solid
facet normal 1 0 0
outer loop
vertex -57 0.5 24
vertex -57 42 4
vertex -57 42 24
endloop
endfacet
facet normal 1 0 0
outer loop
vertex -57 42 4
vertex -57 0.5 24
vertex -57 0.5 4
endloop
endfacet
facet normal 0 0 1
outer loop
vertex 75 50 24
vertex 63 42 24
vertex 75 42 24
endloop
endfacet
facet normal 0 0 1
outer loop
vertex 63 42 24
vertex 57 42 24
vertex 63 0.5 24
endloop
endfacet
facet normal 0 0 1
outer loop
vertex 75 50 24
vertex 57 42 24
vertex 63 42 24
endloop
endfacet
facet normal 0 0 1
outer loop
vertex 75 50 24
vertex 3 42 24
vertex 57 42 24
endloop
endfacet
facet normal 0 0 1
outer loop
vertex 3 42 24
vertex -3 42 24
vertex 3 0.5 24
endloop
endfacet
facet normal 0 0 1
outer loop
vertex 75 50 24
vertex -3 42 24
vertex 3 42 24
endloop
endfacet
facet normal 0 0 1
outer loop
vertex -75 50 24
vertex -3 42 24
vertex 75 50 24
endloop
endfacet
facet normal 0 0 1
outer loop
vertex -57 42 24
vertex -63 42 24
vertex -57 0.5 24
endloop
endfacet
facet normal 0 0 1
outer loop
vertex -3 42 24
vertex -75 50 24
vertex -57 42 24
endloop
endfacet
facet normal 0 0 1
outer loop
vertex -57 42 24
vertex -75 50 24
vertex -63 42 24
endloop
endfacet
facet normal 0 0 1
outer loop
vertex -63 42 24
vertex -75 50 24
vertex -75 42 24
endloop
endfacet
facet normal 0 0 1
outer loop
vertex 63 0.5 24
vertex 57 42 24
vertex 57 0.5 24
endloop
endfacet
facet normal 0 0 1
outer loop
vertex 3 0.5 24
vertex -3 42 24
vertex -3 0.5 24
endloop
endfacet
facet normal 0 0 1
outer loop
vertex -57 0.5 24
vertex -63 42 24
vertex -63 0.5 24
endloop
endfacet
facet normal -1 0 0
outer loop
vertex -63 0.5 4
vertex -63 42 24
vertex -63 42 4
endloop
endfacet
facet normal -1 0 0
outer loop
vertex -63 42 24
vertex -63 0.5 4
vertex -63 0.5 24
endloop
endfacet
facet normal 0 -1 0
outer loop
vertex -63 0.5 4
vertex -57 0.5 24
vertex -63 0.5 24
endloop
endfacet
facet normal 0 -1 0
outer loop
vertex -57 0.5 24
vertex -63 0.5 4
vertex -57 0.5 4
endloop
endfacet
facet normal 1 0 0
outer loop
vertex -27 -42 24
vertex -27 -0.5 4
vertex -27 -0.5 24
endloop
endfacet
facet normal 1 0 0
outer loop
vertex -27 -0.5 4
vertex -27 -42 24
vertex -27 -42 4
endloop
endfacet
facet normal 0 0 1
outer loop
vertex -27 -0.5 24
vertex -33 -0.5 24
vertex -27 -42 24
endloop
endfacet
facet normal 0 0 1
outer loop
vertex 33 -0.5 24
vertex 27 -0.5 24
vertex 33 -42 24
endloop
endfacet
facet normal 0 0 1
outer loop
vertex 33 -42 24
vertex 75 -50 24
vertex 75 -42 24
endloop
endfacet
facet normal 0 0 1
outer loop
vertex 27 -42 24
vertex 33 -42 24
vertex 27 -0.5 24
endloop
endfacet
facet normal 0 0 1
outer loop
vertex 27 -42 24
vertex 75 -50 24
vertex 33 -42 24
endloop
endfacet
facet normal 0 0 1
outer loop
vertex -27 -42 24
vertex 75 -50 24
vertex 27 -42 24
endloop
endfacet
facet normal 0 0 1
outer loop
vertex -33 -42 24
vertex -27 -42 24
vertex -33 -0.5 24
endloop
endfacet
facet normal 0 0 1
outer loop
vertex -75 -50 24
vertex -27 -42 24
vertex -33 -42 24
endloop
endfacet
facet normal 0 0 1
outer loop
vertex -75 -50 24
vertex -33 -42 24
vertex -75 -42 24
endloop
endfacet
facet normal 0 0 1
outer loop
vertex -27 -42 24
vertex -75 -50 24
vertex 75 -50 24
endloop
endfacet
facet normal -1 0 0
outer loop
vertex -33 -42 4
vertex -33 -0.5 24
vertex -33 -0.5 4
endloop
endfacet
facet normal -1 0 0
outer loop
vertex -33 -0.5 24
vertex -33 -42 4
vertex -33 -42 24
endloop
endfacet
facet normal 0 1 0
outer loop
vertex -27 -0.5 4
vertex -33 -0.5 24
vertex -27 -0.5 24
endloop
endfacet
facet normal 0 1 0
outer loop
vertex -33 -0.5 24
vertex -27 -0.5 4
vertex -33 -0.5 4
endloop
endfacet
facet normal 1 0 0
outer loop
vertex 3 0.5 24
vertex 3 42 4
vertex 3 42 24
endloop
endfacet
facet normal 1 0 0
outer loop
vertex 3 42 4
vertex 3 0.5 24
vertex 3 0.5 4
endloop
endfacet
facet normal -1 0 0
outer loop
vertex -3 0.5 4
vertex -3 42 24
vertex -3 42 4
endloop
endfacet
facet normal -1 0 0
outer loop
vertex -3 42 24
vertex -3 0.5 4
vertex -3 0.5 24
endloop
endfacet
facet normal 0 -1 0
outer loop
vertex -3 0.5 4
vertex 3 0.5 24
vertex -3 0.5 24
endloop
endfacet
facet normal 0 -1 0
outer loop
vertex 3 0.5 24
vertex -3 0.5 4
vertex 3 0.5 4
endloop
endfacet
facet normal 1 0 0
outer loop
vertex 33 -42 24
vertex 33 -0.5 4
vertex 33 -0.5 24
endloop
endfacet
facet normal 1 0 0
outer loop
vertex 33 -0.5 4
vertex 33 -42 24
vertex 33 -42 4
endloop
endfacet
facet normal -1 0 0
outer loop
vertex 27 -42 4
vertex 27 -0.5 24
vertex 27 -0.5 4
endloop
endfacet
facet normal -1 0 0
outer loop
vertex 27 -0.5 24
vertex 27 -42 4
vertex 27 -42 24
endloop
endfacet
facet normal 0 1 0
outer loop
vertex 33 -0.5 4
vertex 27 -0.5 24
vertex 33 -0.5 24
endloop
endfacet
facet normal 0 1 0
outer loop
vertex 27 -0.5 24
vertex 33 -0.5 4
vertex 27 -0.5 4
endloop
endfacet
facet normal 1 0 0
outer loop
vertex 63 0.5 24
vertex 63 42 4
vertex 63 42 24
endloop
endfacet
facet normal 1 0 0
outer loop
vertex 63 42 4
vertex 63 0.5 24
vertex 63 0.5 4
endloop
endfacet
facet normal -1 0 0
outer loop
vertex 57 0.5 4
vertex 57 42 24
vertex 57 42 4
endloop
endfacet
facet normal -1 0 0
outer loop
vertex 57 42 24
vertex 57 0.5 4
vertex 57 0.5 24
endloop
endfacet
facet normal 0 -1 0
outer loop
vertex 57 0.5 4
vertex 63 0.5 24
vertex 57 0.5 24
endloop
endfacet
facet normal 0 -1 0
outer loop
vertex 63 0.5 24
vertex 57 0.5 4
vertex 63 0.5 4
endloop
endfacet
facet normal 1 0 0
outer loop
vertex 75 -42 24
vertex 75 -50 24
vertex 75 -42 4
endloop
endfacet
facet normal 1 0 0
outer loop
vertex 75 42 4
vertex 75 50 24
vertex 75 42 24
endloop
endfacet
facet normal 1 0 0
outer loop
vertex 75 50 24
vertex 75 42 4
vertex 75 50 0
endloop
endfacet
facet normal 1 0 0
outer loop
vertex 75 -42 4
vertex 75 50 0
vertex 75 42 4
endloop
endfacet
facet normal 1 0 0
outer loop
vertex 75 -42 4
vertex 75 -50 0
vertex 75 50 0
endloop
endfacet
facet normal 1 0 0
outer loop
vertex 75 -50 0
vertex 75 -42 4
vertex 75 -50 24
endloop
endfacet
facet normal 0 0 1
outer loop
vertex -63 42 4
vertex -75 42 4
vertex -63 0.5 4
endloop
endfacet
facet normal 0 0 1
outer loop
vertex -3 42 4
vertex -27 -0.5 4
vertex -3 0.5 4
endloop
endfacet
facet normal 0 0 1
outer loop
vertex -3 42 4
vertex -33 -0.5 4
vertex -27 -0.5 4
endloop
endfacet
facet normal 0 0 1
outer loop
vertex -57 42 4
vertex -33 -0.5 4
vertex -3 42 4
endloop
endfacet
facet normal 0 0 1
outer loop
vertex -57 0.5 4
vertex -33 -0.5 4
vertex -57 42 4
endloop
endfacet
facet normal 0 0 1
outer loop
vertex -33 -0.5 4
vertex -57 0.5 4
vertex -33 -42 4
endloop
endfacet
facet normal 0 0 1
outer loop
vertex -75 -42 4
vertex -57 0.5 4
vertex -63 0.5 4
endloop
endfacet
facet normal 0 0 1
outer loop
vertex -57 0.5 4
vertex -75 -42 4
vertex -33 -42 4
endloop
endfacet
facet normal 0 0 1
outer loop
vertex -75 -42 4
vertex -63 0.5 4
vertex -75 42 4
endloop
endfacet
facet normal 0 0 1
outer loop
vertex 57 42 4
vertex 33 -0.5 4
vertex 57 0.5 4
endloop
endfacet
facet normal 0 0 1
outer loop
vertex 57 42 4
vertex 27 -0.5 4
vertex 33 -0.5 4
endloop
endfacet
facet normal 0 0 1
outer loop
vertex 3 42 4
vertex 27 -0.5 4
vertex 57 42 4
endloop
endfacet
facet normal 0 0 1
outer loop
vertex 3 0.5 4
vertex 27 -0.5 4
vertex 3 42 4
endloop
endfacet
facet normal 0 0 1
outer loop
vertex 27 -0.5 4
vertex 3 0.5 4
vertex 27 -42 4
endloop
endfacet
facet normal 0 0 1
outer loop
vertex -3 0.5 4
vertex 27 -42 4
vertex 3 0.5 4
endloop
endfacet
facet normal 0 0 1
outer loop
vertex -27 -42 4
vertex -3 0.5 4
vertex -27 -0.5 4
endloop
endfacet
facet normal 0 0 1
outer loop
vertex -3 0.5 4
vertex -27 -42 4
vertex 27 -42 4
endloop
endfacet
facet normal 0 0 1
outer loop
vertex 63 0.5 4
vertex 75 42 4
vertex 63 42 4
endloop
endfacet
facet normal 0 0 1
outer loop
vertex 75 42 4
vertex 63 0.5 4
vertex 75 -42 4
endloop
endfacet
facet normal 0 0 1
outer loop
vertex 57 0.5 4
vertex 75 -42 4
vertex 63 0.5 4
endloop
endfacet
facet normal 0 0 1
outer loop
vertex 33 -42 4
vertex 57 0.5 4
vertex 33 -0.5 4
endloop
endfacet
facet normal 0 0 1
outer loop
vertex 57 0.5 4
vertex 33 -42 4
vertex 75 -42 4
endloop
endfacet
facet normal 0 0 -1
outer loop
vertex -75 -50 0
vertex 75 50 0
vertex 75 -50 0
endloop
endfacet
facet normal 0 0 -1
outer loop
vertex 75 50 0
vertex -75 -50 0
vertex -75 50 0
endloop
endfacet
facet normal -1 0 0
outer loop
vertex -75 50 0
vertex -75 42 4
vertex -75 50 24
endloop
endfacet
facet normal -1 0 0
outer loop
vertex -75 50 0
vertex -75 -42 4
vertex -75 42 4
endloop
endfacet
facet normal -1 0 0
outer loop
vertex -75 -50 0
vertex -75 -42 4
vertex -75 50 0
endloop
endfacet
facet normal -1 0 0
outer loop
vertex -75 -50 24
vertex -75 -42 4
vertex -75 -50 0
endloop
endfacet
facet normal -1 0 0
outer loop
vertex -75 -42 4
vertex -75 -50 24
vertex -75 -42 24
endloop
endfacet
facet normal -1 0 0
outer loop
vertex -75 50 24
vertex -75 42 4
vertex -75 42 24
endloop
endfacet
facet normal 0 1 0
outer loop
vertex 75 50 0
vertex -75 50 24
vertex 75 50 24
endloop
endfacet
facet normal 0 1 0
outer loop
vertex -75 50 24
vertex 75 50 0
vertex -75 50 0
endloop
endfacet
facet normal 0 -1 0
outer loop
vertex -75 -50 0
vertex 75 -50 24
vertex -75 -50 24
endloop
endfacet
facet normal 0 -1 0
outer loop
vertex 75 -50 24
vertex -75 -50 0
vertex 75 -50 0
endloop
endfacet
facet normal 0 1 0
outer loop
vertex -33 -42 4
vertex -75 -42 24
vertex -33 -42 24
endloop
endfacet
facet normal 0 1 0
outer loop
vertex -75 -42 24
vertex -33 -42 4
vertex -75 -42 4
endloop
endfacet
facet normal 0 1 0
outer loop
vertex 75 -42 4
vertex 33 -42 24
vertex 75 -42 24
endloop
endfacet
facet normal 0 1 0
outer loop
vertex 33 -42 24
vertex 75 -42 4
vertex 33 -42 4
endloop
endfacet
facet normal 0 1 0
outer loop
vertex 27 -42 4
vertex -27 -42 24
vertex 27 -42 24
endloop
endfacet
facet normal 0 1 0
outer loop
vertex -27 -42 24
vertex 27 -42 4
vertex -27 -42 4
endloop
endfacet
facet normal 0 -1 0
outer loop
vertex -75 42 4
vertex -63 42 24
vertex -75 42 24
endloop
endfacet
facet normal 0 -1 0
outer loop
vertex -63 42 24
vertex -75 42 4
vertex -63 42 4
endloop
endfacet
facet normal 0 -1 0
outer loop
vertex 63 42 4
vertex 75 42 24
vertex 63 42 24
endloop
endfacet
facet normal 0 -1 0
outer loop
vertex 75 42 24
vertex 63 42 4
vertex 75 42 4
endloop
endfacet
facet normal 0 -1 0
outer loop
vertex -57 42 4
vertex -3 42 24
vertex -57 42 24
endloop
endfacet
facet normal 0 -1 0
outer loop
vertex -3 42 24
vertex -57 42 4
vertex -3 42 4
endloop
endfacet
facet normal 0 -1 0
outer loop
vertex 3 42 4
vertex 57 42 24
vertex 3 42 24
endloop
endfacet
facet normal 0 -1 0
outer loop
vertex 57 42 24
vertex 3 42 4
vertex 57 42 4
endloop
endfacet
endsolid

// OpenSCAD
$fn = 32;

// ----------------------------------------------------------------------
// Rib frame 150 x 100 x 24
// 5 ribs at 30 mm pitch, staggered
// ----------------------------------------------------------------------

// --- parameters (mm) ---
frame = [150, 100, 4];  // base plate size (x, y, z)
rail_w = 8;             // side rail width
ribs = 5;               // number of ribs
rib_t = 6;              // rib thickness
rib_h = 20;             // rib height above the base plate
pitch = 30;             // pitch between rib centres

// --- derived feature positions (mm) ---
span = (ribs - 1) * pitch;          // = 120   distance between the outer ribs
origin_x = -span / 2;               // = -60   X of the first rib
rib_len = frame[1] / 2 - rail_w + 0.5;  // = 42.5   length of a staggered rib
rib_y = 0.5 + rib_len / 2;          // = 21.75   Y of a staggered rib centre
row_offset = 2 * rib_y;             // = 43.5   distance between the two rows
feature_centers = [
  [origin_x + 0 * pitch, rib_y],
  [origin_x + 1 * pitch, -rib_y],
  [origin_x + 2 * pitch, rib_y],
  [origin_x + 3 * pitch, -rib_y],
  [origin_x + 4 * pitch, rib_y]
];   // rib centre line, drives the rib loop

// base plate, two side rails, then the ribs read straight off feature_centers
union() {
  translate([-frame[0] / 2, -frame[1] / 2, 0]) cube(frame);
  translate([-frame[0] / 2, -frame[1] / 2, 0]) cube([frame[0], rail_w, frame[2] + rib_h]);
  translate([-frame[0] / 2, frame[1] / 2 - rail_w, 0]) cube([frame[0], rail_w, frame[2] + rib_h]);
  for (centre = feature_centers)
    translate([centre[0] - rib_t / 2, centre[1] - rib_len / 2, frame[2] - 1])
      cube([rib_t, rib_len, rib_h + 1]);
}
